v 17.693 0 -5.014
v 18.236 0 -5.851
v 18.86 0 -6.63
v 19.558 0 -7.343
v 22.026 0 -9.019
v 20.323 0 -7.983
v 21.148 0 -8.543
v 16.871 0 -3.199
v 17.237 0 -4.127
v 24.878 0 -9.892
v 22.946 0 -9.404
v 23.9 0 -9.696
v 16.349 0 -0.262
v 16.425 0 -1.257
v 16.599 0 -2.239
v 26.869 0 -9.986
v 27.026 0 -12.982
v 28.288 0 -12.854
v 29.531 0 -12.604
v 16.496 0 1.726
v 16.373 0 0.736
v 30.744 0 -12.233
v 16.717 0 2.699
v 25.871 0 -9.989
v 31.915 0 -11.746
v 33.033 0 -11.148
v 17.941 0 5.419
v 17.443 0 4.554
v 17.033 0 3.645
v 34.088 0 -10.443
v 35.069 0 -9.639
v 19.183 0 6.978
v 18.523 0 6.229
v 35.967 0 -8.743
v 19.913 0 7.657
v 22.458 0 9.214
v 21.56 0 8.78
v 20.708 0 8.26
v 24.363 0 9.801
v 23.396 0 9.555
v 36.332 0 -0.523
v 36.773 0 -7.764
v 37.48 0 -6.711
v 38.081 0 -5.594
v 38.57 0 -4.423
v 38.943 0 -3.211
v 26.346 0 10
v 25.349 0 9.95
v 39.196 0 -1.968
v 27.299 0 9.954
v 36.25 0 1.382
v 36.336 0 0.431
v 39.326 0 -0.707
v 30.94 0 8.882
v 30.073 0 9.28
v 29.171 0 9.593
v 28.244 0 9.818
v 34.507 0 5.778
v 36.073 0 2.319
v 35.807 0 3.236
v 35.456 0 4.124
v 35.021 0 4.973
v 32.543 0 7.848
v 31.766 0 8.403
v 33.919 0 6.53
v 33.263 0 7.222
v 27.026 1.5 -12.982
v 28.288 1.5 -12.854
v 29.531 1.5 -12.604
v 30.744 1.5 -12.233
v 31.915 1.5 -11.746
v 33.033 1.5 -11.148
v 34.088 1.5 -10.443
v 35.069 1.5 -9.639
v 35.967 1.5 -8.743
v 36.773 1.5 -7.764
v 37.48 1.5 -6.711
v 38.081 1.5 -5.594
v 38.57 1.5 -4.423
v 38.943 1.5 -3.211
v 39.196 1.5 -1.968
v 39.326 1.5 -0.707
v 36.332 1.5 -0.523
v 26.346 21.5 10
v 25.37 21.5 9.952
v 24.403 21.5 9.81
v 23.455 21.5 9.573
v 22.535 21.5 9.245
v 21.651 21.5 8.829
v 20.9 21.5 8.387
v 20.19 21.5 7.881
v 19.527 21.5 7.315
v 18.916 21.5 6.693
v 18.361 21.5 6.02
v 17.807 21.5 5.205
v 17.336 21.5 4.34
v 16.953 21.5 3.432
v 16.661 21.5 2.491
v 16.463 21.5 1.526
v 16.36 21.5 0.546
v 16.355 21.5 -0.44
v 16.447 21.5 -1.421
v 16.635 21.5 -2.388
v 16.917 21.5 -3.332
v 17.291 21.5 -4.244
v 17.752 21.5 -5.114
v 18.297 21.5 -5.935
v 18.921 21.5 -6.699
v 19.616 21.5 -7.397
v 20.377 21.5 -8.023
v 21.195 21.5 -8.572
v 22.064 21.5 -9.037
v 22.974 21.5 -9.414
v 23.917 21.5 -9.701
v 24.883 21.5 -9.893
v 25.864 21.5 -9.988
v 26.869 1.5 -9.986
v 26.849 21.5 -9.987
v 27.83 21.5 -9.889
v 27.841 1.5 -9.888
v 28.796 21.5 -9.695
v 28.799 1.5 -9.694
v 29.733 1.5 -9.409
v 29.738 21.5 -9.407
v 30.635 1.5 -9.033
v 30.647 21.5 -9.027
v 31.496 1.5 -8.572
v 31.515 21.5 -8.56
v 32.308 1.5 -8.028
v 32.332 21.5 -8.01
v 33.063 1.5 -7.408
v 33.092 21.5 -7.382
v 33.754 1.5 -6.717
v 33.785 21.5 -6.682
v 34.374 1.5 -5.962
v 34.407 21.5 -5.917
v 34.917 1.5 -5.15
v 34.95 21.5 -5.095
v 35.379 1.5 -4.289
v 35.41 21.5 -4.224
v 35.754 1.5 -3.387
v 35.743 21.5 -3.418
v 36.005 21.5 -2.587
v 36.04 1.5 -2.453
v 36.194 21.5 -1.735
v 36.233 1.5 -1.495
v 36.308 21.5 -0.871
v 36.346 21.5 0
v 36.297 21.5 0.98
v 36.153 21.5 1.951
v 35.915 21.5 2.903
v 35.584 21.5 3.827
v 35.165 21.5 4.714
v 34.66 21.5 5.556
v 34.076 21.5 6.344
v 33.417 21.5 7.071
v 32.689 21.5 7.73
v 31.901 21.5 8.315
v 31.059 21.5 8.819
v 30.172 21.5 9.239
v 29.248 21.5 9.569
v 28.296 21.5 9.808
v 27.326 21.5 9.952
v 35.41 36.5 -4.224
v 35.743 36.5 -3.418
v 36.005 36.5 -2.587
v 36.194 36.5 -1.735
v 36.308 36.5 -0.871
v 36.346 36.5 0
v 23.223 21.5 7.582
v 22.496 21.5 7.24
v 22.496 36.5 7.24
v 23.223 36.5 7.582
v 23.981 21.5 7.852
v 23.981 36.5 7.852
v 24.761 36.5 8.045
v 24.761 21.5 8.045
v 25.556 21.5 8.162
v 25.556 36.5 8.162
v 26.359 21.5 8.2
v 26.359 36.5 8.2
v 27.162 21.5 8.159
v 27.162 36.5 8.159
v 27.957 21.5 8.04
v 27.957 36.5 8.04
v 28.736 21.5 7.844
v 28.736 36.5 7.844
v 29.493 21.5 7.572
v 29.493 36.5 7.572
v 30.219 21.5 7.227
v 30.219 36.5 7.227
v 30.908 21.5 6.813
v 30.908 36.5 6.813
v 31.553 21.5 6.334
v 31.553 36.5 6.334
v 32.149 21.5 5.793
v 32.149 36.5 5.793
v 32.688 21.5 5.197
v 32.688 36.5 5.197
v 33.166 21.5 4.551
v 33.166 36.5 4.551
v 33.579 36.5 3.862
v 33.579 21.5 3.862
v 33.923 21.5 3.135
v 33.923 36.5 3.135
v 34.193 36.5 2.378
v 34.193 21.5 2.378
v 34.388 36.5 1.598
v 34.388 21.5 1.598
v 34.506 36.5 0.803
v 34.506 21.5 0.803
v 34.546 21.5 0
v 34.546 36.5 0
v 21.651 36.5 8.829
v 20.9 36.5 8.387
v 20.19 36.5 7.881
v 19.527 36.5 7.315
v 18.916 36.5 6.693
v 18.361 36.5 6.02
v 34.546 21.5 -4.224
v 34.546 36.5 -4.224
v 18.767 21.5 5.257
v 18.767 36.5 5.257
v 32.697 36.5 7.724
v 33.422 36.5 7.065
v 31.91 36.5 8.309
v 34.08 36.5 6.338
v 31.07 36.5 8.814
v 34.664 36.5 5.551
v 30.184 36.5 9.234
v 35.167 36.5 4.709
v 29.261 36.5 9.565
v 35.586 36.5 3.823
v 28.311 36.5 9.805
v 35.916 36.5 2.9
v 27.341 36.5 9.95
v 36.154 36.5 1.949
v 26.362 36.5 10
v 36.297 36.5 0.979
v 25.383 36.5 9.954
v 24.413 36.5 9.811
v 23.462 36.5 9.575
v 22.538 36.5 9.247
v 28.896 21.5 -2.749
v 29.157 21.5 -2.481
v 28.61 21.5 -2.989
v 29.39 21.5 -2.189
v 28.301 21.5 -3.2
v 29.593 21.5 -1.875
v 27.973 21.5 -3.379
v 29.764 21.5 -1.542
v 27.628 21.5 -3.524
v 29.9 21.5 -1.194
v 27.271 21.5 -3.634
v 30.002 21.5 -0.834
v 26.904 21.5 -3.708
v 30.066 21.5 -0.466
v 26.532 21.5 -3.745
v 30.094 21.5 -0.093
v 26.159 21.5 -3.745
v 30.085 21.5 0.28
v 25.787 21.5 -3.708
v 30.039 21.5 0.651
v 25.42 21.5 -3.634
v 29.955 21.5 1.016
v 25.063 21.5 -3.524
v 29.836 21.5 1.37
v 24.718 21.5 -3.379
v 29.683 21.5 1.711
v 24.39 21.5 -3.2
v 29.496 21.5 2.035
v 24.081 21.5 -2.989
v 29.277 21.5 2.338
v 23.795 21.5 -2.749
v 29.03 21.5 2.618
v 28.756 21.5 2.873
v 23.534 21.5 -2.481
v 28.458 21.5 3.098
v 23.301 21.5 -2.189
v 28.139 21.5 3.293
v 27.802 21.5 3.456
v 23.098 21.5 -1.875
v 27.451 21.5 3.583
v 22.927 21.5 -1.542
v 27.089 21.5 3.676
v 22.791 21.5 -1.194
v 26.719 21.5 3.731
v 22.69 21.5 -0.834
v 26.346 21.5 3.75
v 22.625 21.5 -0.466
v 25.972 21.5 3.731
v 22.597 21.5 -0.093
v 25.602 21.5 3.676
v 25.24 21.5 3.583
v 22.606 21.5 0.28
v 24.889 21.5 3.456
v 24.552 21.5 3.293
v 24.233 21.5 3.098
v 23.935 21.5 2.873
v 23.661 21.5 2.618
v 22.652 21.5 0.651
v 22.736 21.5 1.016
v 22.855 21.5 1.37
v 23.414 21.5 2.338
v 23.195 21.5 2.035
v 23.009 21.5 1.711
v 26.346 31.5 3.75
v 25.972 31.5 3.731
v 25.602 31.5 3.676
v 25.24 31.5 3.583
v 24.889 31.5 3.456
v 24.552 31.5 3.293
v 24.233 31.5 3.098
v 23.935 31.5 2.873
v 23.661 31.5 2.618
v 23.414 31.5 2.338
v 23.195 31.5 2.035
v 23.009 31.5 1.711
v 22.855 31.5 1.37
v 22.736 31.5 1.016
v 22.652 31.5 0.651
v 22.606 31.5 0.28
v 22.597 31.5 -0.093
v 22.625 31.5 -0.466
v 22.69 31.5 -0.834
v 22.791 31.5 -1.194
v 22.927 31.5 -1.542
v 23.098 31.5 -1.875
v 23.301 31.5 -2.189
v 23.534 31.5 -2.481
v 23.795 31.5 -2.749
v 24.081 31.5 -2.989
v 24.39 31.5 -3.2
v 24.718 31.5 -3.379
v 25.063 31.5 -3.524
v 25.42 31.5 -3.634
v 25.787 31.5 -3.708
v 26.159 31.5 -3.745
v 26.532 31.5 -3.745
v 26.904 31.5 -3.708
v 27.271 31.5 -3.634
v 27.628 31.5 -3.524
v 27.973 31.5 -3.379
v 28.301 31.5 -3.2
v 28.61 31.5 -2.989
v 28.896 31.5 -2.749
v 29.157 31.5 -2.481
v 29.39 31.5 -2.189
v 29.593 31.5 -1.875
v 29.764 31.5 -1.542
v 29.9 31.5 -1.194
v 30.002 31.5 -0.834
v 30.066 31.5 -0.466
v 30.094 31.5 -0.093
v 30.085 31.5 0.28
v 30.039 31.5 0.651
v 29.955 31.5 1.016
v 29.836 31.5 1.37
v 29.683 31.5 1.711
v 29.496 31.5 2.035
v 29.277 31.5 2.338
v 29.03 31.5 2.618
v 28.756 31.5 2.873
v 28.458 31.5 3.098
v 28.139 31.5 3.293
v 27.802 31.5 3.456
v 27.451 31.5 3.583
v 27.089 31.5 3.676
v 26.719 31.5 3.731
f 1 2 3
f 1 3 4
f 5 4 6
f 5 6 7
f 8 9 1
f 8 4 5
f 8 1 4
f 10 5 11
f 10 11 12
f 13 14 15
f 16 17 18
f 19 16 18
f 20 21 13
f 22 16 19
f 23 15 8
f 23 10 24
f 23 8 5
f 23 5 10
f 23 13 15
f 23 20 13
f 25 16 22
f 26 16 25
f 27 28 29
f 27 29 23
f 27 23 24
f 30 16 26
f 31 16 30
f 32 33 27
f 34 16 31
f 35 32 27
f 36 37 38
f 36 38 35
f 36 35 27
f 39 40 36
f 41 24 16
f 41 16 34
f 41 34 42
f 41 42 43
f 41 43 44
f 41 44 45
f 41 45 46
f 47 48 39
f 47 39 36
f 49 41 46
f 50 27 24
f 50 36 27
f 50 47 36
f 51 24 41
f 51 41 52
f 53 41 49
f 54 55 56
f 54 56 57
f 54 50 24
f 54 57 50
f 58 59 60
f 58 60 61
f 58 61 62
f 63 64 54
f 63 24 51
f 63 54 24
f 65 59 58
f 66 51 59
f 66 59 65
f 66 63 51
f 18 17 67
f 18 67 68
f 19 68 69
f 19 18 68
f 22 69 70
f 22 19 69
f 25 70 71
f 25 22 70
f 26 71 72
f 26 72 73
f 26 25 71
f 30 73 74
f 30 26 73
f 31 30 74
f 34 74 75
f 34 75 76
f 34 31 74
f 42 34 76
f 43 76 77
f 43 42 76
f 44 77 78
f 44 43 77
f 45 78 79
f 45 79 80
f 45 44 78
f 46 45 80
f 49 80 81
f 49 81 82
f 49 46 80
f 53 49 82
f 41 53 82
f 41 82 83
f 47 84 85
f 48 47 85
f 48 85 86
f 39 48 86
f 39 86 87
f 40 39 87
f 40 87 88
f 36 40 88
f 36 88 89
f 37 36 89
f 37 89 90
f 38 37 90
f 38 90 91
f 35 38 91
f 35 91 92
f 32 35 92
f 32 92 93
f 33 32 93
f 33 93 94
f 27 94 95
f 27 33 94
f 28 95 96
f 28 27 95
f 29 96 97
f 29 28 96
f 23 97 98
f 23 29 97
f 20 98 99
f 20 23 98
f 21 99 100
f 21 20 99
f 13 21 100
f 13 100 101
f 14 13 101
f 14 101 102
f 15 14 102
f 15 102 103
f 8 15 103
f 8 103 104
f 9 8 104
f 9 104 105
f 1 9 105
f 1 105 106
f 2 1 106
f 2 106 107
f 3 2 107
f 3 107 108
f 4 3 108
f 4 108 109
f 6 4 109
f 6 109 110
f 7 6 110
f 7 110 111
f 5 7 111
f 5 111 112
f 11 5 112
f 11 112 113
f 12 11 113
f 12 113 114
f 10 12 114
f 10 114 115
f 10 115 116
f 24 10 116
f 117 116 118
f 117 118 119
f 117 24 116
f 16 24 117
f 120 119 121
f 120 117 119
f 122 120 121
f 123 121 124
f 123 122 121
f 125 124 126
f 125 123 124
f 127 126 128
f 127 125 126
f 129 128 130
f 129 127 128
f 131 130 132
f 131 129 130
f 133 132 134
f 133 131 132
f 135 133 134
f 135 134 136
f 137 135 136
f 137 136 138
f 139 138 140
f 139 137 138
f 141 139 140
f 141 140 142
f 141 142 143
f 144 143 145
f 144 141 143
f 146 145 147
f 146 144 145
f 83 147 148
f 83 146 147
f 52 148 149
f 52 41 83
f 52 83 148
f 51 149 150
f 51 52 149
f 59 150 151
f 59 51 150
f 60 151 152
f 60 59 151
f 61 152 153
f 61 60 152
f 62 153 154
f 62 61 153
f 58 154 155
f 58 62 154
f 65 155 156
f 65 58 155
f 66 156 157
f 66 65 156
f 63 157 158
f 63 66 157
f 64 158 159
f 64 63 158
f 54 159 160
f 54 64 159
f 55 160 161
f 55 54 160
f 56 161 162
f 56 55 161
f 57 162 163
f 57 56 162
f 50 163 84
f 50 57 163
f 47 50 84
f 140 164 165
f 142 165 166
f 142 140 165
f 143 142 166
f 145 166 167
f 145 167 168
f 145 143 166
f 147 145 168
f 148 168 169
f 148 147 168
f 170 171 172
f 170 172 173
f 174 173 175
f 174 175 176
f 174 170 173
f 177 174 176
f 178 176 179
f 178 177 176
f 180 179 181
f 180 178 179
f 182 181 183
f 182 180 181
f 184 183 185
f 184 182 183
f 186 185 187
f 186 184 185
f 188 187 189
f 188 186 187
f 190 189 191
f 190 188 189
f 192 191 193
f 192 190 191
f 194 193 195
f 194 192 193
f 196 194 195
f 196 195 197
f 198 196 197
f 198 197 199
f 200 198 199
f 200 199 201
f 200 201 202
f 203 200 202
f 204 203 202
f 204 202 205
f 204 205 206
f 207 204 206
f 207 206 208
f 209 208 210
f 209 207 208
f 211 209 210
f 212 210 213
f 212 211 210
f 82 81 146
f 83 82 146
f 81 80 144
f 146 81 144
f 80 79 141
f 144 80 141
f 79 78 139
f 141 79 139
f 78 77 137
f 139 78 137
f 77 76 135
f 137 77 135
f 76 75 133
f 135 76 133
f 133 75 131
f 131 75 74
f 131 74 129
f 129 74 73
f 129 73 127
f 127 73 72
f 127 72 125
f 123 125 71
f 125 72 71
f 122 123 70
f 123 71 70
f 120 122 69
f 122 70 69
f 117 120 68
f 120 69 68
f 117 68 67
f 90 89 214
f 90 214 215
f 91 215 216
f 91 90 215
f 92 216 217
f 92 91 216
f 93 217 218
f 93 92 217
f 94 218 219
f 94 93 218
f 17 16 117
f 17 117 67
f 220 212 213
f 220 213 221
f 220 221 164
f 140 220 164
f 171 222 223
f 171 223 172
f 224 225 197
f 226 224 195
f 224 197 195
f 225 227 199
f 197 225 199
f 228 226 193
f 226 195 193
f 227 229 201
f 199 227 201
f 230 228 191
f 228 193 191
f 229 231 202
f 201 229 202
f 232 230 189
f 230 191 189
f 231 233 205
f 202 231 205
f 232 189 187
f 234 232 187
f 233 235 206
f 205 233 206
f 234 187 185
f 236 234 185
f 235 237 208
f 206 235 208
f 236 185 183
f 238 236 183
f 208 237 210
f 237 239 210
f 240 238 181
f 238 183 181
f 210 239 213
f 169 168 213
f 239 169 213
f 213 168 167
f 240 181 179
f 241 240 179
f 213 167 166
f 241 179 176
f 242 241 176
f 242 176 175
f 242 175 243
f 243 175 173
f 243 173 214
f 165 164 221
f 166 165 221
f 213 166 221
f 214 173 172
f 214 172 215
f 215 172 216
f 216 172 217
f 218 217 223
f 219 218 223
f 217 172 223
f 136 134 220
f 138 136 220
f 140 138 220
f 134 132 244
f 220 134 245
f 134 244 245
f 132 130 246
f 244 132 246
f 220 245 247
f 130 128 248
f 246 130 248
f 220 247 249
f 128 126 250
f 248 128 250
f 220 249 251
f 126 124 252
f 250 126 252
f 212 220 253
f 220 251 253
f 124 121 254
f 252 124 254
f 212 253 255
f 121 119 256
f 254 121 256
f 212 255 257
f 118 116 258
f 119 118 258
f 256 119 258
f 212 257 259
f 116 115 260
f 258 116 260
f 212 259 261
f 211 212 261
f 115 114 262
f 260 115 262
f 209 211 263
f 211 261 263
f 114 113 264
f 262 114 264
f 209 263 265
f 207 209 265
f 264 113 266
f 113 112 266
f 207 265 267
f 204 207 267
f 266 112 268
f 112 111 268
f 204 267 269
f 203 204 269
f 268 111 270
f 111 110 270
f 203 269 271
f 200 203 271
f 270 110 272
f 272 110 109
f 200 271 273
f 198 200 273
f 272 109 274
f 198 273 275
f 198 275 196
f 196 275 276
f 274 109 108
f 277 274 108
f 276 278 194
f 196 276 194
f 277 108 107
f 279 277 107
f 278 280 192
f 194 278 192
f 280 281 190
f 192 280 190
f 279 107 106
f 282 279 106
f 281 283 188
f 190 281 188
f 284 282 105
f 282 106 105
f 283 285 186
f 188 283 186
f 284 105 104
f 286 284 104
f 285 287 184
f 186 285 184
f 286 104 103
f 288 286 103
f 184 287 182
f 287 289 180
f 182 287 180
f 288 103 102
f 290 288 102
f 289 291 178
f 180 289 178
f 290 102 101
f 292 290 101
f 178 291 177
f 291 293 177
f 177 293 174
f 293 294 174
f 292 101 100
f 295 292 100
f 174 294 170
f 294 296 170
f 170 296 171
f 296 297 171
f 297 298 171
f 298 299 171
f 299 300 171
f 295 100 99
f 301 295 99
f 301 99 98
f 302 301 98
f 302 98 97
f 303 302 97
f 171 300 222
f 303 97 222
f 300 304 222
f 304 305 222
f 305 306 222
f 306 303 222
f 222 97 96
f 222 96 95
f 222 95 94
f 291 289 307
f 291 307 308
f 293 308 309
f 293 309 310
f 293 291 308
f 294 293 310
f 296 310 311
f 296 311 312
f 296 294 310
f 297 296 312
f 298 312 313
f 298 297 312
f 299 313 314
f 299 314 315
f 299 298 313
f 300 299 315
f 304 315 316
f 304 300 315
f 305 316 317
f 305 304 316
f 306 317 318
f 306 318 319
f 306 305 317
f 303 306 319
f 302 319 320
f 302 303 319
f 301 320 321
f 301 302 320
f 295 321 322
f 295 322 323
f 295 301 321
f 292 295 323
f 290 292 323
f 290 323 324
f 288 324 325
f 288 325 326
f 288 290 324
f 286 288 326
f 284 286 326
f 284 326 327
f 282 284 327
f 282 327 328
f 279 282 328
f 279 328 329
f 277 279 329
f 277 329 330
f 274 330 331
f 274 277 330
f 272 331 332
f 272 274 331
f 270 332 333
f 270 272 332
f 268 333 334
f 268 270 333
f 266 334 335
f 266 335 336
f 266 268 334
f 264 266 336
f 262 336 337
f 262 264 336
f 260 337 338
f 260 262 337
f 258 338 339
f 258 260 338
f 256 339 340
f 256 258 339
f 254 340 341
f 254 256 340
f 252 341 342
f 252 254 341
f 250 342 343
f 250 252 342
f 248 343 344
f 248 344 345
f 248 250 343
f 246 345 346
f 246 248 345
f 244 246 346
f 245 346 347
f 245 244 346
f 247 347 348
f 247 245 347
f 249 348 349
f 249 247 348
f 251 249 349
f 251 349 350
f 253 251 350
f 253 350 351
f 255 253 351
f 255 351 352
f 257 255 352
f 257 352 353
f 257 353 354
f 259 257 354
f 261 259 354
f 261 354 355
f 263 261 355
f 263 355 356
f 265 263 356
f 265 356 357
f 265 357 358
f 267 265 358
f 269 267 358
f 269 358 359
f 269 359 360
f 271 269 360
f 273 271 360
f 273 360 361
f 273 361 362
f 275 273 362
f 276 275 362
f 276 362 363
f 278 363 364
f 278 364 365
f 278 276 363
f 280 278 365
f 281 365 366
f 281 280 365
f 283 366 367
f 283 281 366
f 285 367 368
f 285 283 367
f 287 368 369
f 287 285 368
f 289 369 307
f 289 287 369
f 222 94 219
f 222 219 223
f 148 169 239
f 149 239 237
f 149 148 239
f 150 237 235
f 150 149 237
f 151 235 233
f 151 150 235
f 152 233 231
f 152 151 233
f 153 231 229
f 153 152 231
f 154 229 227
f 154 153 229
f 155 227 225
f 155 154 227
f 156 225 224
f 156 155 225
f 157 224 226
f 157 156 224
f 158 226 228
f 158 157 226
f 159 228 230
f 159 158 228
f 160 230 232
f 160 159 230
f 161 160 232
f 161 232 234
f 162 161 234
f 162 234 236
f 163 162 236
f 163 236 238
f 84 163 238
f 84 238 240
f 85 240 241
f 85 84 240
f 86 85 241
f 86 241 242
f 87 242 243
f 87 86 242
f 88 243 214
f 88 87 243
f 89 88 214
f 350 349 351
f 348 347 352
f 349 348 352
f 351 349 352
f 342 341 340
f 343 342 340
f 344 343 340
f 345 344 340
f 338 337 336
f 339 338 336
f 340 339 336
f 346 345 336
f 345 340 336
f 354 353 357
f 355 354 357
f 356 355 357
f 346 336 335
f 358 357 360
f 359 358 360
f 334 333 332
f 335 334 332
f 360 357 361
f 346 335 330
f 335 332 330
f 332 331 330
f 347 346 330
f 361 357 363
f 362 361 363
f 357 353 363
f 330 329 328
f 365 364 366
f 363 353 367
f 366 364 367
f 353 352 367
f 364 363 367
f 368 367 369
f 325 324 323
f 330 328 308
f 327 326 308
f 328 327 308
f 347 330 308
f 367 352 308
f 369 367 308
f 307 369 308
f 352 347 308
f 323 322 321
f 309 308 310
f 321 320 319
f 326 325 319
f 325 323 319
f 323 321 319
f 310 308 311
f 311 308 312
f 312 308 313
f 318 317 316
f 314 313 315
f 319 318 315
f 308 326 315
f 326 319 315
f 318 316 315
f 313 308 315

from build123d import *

# Parameters (mm, degrees)
SKETCH1_R           = 10
SKETCH1_R_2         = 7.636363636
BOSS_EXTRUDE1_DEPTH = 21.5
BOSS_EXTRUDE2_DEPTH = 15
SKETCH3_R           = 3.75
BOSS_EXTRUDE3_DEPTH = 10
BOSS_EXTRUDE4_DEPTH = 1.5
SKETCH6_W           = 32.555421104
SKETCH6_H           = 30.593451785
BOSS_EXTRUDE5_DEPTH = 1.5
SKETCH8_W           = 32.555421103
SKETCH8_H           = 30.593451785
CUT_EXTRUDE1_DEPTH  = 1.5


# Read off the part's stored shape, not the designer's step: Boss-Extrude4
with BuildPart() as part:
    # Sketch1 → Boss-Extrude1 (new body)
    # profile 1 of 2: a face of its own
    with BuildSketch(Plane(origin=(0, 0, 0), x_dir=(1, 0, 0), z_dir=(0, 1, 0))):
        with Locations(Location((0, 0, 0), (0, 0, 270))):
            Circle(SKETCH1_R)
        Circle(SKETCH1_R_2, mode=Mode.SUBTRACT)
    # profile 2 of 2: a face of its own
    with BuildSketch(Plane(origin=(0, 0, 0), x_dir=(1, 0, 0), z_dir=(0, 1, 0))):
        Circle(SKETCH1_R_2)
    extrude(amount=BOSS_EXTRUDE1_DEPTH)

    # Sketch2 → Boss-Extrude2 (add)
    with BuildSketch(Plane(origin=(0, 21.5, 0), x_dir=(1, 0, 0), z_dir=(0, 1, 0))):
        with BuildLine():
            ThreePointArc((3.849666815, -7.240170261), (-4.223312214, -7.028771866), (-8.2, 0))
            Line((-8.2, 0), (-10, 0))
            ThreePointArc((-10, 0), (-5.150380749, -8.571673007), (4.694715628, -8.829475929))
            Line((4.694715628, -8.829475929), (3.849666815, -7.240170261))
        make_face()
        with BuildLine():
            Line((7.578915355, -5.257293639), (3.849666815, -7.240170261))
            Line((3.849666815, -7.240170261), (4.694715628, -8.829475929))
            ThreePointArc((4.694715628, -8.829475929), (6.493411832, -7.604972241), (7.984663341, -6.020394615))
            Line((7.984663341, -6.020394615), (7.578915355, -5.257293639))
        make_face()
        with BuildLine():
            Line((-10, 0), (-8.2, 0))
            Line((-8.2, 0), (-8.2, 4.223635209))
            Line((-8.2, 4.223635209), (-9.064265311, 4.223635209))
            ThreePointArc((-9.064265311, 4.223635209), (-9.763264134, 2.163024144), (-10, 0))
        make_face()
    extrude(amount=BOSS_EXTRUDE2_DEPTH)

    # Sketch3 → Boss-Extrude3 (add)
    with BuildSketch(Plane(origin=(0, 21.5, 0), x_dir=(1, 0, 0), z_dir=(0, 1, 0))):
        with Locations(Location((0, 0, 0), (0, 0, 270))):
            Circle(SKETCH3_R)
    extrude(amount=BOSS_EXTRUDE3_DEPTH)

    # Boss-Extrude4 outline → Boss-Extrude4 (add)
    with BuildSketch(Plane(origin=(0, 0, 0), x_dir=(1, 0, 0), z_dir=(0, 1, 0))):
        with BuildLine():
            ThreePointArc((-0.680367431, 12.982183952), (-9.183045771, 9.201721054), (-12.980774925, 0.706740657))
            Line((-12.980774925, 0.706740657), (-9.986295348, 0.523359562))
            Line((-9.986295348, 0.523359562), (-1.440215285, 0))
            Line((-1.440215285, 0), (0, 0))
            Line((0, 0), (-0.523359562, 9.986295348))
            Line((-0.523359562, 9.986295348), (-0.680367431, 12.982183952))
        make_face()
    extrude(amount=BOSS_EXTRUDE4_DEPTH)

    # Sketch6 → Boss-Extrude5 (add)
    with BuildSketch(Plane.XZ):
        with Locations((-3.104949277, 0.730287835)):
            Rectangle(SKETCH6_W, SKETCH6_H)
    extrude(amount=BOSS_EXTRUDE5_DEPTH)


with BuildPart() as body_2:
    # Mirror6: mirrored copy
    add(part.part.mirror(Plane(origin=(13.172761275, -1.5, 16.027013728), x_dir=(0, 0, 1), z_dir=(-1, 0, 0))))

    # Sketch8 → Cut-Extrude1 (cut)
    with BuildSketch(Plane.XZ.offset(1.5)):
        with Locations((29.450471826, 0.730287835)):
            Rectangle(SKETCH8_W, SKETCH8_H)
    extrude(amount=-CUT_EXTRUDE1_DEPTH, mode=Mode.SUBTRACT)


solid = body_2.part
